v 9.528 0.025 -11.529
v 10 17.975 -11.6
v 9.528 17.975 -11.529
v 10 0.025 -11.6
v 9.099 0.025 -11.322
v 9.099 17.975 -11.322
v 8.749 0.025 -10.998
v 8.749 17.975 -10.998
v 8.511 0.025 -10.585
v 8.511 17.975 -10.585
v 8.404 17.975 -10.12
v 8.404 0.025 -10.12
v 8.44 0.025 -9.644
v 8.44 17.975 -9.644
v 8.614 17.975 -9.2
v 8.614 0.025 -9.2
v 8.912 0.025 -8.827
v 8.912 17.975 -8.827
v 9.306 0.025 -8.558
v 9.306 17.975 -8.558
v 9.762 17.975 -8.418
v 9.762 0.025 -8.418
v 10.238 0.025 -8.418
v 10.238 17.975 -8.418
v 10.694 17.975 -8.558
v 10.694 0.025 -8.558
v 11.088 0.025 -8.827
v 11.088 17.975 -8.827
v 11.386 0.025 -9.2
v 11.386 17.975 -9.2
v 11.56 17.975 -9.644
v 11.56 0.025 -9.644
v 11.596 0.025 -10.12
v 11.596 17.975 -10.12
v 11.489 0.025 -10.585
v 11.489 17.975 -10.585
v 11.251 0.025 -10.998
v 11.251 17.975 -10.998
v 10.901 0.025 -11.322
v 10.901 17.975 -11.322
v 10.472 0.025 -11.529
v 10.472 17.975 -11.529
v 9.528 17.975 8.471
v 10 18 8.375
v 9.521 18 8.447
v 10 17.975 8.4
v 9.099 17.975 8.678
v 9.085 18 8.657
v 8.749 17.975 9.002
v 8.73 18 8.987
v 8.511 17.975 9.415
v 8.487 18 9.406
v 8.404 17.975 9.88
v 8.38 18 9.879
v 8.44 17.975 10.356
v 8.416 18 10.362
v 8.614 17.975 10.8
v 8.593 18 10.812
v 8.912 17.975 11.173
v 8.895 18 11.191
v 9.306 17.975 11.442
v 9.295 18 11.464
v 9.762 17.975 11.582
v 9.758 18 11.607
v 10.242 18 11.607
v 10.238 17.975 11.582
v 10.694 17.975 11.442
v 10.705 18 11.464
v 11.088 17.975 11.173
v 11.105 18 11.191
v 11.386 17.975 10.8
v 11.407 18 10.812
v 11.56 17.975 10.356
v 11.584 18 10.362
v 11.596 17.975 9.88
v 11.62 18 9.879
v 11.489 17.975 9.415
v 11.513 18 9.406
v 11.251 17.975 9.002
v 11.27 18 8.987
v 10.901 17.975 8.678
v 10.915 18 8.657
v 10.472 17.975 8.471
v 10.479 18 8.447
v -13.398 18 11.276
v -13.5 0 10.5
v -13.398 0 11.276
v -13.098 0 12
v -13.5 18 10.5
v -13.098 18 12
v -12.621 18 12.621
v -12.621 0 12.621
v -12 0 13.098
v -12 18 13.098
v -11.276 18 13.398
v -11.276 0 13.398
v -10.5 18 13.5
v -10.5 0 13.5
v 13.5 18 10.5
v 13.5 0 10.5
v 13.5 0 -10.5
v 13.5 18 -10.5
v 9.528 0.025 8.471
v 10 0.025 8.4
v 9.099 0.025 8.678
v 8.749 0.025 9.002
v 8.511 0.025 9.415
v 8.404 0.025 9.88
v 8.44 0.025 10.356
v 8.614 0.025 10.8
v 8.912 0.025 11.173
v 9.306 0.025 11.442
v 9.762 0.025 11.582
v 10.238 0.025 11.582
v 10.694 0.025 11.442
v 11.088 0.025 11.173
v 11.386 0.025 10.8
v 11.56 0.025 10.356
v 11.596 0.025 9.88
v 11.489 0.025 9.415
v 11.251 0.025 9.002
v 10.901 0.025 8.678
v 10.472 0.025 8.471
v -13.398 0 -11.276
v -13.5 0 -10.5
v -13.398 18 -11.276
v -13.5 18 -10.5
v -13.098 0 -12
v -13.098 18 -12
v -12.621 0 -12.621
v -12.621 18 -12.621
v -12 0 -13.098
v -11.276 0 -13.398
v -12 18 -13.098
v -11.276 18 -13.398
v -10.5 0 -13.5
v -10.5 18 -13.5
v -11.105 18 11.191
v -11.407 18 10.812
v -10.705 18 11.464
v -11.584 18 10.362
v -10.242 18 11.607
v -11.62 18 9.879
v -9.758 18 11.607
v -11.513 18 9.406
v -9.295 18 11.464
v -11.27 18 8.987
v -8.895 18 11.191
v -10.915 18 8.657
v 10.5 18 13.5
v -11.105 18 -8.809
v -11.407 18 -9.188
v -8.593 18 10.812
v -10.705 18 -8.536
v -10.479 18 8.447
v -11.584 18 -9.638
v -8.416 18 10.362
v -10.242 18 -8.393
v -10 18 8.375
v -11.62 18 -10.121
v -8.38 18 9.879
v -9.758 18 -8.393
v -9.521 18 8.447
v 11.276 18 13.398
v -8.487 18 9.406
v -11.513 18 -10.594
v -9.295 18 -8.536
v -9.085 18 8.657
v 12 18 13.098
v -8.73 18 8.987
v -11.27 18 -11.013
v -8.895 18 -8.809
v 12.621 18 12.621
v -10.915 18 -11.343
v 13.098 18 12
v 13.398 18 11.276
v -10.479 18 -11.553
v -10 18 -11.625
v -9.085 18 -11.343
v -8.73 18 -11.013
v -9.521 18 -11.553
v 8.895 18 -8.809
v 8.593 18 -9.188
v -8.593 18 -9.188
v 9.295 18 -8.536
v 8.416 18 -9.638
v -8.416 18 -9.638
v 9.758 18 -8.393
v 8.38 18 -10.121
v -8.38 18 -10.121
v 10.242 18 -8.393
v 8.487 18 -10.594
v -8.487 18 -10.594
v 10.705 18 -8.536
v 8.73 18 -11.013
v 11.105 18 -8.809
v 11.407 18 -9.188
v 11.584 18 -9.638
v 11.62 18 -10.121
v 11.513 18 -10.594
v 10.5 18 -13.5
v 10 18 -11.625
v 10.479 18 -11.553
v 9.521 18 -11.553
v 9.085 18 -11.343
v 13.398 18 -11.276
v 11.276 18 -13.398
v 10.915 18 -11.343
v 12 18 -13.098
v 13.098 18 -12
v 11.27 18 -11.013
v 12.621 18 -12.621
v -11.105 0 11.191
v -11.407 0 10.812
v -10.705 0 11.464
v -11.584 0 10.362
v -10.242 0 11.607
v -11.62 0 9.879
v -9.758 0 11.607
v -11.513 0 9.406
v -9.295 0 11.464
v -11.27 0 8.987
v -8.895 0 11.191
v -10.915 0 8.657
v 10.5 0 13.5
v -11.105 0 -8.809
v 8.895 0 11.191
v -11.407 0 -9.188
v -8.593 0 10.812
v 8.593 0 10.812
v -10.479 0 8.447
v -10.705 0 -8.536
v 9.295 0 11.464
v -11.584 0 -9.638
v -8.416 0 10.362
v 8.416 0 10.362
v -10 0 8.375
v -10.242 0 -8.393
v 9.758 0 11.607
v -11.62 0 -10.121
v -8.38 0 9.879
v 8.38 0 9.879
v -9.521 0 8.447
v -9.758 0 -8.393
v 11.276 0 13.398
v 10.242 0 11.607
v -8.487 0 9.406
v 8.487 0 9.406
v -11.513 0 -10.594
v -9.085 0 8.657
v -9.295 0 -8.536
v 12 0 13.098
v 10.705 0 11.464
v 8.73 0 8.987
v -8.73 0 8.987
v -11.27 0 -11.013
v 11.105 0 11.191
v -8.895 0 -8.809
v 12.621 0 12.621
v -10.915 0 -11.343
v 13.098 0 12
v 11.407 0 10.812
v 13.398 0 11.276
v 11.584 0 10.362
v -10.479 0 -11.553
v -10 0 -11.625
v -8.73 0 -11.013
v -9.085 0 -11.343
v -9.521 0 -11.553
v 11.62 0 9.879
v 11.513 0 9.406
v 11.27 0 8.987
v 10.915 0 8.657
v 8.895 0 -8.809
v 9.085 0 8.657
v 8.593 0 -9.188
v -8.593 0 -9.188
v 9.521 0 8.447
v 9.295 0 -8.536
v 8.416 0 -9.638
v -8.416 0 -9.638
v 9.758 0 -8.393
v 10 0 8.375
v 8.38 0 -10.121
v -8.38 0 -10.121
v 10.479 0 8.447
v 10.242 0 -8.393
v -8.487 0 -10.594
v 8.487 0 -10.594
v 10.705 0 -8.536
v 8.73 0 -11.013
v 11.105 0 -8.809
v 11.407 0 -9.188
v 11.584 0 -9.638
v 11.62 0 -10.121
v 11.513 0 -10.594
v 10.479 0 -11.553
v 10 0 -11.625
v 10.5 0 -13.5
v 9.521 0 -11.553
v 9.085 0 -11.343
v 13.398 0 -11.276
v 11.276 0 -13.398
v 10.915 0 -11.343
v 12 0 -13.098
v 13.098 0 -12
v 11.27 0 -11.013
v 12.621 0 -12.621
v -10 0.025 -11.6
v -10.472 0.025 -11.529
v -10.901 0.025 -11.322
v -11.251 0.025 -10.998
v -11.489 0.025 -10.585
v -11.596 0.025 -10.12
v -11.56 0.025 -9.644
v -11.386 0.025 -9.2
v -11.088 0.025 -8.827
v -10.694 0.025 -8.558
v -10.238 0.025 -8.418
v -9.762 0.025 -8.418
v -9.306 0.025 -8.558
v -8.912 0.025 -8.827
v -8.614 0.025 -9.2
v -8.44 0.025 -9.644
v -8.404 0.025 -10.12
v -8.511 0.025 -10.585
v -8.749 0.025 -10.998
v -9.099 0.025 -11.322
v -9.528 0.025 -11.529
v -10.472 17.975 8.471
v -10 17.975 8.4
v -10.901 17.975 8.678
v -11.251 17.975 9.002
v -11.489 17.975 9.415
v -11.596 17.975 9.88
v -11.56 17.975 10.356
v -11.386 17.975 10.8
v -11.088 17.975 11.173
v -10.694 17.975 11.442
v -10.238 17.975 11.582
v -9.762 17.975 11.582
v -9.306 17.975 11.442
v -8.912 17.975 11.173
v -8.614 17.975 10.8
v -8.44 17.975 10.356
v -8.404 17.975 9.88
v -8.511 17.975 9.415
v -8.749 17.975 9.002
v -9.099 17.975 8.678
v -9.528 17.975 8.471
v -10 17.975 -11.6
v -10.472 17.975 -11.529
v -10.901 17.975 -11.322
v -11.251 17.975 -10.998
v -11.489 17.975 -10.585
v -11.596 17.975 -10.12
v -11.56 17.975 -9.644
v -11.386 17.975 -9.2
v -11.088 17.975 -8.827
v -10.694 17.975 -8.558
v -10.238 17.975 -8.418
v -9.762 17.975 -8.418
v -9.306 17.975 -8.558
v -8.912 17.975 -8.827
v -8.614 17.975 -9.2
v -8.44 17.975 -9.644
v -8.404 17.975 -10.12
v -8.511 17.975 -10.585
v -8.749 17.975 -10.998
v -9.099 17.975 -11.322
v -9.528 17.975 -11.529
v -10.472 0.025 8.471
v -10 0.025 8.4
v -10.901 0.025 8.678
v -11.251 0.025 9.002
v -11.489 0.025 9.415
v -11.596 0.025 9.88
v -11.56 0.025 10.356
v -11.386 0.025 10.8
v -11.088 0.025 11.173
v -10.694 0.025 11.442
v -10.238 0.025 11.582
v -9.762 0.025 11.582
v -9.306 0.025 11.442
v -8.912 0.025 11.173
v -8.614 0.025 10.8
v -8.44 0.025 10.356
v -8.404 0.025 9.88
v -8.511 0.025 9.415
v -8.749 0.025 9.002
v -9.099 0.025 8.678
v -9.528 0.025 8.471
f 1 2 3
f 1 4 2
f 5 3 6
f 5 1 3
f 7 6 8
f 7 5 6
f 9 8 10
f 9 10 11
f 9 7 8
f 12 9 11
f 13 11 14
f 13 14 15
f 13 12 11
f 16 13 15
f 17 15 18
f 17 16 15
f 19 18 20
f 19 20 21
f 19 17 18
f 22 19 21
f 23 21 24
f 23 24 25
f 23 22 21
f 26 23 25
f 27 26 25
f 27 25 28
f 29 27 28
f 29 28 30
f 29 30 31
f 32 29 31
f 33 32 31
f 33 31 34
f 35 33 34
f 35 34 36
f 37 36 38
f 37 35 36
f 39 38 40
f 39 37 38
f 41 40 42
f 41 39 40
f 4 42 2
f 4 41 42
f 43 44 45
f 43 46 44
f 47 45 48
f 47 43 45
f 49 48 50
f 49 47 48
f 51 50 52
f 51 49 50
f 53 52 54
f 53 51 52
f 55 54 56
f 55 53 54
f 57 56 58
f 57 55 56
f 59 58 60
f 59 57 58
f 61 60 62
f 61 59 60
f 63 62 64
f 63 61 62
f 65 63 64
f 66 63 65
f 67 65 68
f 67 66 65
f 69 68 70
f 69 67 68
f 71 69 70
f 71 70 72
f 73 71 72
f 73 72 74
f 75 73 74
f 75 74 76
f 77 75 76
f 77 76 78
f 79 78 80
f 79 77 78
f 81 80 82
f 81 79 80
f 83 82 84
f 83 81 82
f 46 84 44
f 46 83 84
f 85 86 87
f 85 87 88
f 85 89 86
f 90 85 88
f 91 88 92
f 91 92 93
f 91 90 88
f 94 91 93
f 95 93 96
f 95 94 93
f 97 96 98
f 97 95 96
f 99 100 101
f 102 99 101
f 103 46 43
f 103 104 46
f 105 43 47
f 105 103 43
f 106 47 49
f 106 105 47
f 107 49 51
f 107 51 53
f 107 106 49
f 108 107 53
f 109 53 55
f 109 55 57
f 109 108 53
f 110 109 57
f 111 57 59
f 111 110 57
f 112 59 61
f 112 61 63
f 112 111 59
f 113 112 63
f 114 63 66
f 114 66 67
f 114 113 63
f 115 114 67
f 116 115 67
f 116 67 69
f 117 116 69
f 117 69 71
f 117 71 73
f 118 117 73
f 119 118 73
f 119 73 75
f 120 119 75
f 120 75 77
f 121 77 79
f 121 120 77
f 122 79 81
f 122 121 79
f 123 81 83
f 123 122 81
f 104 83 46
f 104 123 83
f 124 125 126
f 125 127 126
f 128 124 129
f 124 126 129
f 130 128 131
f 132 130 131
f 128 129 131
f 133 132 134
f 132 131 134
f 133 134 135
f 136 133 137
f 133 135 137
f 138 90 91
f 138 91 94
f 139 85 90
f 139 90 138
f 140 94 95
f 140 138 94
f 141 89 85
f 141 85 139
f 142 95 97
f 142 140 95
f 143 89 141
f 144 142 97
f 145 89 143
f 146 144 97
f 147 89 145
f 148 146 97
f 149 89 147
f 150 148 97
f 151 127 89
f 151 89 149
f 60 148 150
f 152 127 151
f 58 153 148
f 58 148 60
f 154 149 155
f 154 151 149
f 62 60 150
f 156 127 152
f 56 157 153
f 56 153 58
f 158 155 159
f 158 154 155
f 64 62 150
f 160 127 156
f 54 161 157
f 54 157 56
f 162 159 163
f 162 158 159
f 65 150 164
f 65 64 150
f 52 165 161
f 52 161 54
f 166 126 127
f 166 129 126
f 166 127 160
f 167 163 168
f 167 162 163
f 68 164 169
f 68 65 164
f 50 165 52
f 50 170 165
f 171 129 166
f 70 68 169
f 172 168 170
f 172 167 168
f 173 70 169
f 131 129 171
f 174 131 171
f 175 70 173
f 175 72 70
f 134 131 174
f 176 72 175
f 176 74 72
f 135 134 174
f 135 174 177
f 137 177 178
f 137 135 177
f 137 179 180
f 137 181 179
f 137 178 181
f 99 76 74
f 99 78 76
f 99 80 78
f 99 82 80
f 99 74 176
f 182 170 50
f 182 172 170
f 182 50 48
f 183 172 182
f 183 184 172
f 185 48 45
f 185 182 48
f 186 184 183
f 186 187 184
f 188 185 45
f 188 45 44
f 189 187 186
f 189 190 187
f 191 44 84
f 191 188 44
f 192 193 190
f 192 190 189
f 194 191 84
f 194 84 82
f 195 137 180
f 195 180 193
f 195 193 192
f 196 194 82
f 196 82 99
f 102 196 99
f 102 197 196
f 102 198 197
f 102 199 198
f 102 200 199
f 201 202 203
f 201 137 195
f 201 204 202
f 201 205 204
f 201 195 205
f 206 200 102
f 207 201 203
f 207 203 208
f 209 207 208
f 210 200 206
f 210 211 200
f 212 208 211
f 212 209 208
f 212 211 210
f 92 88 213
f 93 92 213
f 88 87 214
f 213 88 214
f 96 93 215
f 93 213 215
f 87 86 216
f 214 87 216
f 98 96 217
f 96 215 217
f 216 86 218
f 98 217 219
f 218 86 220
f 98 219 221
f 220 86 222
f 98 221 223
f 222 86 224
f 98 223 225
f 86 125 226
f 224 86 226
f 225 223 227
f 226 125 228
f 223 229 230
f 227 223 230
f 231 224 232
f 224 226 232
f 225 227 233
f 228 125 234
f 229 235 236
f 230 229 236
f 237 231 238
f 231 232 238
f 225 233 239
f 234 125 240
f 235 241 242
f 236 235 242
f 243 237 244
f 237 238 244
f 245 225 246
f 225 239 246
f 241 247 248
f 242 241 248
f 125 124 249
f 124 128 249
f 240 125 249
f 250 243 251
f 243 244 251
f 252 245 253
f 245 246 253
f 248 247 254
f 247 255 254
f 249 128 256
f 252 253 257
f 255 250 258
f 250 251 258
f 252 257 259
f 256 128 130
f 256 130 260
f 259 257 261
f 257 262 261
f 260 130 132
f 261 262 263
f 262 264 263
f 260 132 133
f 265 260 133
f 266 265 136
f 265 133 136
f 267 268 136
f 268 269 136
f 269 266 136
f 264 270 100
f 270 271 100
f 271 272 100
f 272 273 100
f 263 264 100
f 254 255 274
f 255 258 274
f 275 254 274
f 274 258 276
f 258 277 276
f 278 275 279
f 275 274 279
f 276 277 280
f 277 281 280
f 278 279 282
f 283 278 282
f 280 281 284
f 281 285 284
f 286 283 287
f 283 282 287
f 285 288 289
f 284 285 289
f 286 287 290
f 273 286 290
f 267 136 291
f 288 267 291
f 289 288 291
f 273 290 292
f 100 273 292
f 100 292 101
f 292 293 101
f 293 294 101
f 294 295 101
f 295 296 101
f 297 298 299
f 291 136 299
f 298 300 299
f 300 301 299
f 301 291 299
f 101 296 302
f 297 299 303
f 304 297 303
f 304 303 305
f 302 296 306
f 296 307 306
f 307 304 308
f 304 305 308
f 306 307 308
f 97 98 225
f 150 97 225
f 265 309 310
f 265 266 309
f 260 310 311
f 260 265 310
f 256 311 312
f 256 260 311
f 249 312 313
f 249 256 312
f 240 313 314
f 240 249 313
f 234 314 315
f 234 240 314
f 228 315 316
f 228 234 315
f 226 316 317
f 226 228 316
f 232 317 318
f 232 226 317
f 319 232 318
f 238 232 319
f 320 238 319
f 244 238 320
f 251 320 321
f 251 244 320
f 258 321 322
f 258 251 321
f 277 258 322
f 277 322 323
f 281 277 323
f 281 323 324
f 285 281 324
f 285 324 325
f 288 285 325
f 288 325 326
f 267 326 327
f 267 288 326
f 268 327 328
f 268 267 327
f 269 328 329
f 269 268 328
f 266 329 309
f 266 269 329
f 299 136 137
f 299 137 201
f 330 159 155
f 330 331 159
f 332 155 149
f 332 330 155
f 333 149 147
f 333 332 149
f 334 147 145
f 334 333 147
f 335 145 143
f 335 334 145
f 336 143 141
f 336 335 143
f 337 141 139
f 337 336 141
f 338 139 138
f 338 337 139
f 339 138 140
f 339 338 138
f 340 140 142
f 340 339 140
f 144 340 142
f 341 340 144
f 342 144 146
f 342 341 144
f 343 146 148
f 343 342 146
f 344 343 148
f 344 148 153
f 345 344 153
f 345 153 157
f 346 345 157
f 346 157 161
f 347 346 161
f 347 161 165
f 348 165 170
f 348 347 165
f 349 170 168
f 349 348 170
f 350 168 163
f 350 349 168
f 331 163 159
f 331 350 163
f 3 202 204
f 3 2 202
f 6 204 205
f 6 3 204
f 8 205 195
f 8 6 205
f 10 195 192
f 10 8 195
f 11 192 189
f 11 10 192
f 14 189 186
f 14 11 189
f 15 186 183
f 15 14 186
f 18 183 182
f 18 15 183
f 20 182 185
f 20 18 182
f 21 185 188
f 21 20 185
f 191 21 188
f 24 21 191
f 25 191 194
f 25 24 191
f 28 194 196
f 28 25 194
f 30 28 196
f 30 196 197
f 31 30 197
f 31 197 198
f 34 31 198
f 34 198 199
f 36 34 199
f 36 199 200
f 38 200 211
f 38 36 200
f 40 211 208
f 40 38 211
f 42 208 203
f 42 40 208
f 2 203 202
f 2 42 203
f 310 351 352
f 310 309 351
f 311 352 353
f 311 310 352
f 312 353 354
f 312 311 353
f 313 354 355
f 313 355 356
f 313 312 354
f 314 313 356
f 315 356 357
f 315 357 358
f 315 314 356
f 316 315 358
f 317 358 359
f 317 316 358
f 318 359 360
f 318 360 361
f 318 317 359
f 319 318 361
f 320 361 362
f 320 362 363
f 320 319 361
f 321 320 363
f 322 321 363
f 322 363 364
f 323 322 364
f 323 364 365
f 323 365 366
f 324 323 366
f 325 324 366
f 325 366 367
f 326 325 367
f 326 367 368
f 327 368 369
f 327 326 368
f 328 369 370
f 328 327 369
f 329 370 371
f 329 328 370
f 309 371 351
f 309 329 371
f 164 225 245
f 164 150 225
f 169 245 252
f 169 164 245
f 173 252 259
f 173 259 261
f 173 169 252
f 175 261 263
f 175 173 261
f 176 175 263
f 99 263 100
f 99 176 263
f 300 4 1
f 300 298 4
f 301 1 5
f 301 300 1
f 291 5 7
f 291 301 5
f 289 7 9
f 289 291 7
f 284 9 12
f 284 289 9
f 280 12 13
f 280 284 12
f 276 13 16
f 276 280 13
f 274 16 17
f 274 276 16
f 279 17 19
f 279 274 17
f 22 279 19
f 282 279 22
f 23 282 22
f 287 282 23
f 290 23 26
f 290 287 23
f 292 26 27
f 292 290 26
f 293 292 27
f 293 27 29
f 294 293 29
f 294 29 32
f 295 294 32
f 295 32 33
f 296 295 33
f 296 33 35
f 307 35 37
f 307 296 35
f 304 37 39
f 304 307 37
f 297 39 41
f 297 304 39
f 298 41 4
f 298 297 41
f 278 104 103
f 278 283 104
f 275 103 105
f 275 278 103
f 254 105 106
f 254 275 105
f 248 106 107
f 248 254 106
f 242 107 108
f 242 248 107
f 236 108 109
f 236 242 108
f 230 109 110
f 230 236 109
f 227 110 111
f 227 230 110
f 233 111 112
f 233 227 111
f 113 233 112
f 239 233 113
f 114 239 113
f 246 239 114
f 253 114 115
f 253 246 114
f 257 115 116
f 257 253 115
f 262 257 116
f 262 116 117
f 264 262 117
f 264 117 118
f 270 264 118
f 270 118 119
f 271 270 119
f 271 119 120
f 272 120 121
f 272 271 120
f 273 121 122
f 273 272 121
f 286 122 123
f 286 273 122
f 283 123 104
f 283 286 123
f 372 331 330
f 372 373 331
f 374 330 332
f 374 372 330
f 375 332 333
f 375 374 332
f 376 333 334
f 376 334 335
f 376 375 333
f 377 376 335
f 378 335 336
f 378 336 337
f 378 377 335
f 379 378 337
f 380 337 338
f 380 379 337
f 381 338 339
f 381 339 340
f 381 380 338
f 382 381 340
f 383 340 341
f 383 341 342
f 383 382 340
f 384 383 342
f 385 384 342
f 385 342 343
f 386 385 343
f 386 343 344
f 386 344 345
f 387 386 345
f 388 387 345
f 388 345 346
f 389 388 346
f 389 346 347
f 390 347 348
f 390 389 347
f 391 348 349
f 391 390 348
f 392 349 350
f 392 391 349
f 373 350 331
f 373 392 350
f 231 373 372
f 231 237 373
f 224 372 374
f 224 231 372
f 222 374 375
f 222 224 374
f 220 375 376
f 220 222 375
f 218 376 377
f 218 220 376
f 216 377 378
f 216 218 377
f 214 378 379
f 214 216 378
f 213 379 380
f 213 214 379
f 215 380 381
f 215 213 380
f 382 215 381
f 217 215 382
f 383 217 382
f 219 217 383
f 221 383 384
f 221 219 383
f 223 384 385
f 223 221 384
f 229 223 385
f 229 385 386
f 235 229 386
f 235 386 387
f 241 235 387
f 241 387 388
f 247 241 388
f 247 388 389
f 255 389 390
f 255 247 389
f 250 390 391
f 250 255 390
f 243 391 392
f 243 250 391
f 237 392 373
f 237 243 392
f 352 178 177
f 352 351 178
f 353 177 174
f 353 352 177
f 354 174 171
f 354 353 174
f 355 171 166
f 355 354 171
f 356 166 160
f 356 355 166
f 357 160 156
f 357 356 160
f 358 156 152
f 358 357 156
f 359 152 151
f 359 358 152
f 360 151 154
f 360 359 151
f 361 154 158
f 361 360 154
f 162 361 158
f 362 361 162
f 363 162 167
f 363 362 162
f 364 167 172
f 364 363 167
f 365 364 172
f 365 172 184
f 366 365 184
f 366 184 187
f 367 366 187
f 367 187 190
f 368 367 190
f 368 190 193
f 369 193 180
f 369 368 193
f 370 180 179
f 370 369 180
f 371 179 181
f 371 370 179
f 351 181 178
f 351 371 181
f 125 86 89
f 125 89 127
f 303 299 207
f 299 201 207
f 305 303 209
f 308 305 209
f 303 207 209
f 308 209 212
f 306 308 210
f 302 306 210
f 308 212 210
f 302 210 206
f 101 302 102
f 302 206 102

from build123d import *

# Parameters (mm, degrees)
SKETCH1_W                     = 27
SKETCH1_H                     = 27
BOSS_EXTRUDE1_DEPTH           = 18
M3_CLEARANCE_HOLE1_AT_2_COUNT = 2
M3_CLEARANCE_HOLE1_AT_2_PITCH = 20
M3_CLEARANCE_HOLE1_AT_3_COUNT = 2
M3_CLEARANCE_HOLE1_AT_3_PITCH = 28.284271247
M3_CLEARANCE_HOLE1_AT_4_COUNT = 2
M3_CLEARANCE_HOLE1_AT_4_PITCH = 20
FILLET1_R                     = 3


with BuildPart() as part:
    # Sketch1 → Boss-Extrude1 (new body)
    with BuildSketch(Plane(origin=(0, 0, 0), x_dir=(1, 0, 0), z_dir=(0, 1, 0))):
        Rectangle(SKETCH1_W, SKETCH1_H)
    extrude(amount=BOSS_EXTRUDE1_DEPTH)

    # Sketch4 → M3 Clearance Hole1 (revolve, cut)
    with BuildSketch(Plane(origin=(10, 0, -10), x_dir=(0, 0, -1), z_dir=(1, 0, 0))):
        Polygon((0, 0), (0, 18), (1.625, 18), (1.6, 17.975), (1.6, 0.025), (1.625, 0), align=None)
    m3_clearance_hole1 = revolve(axis=Axis((10, -6.35, -10), (0, 1, 0)), mode=Mode.SUBTRACT)

    # M3 Clearance Hole1 at 2: M3 Clearance Hole1 ×2
    with Locations(*[(-i * M3_CLEARANCE_HOLE1_AT_2_PITCH, 0, 0) for i in range(1, M3_CLEARANCE_HOLE1_AT_2_COUNT)]):
        add(m3_clearance_hole1, mode=Mode.SUBTRACT)

    # M3 Clearance Hole1 at 3: M3 Clearance Hole1 ×2
    with Locations(*[Vector(-0.7071067811865476, 0, 0.7071067811865475) * (i * M3_CLEARANCE_HOLE1_AT_3_PITCH) for i in range(1, M3_CLEARANCE_HOLE1_AT_3_COUNT)]):
        add(m3_clearance_hole1, mode=Mode.SUBTRACT)

    # M3 Clearance Hole1 at 4: M3 Clearance Hole1 ×2
    with Locations(*[(0, 0, i * M3_CLEARANCE_HOLE1_AT_4_PITCH) for i in range(1, M3_CLEARANCE_HOLE1_AT_4_COUNT)]):
        add(m3_clearance_hole1, mode=Mode.SUBTRACT)

    # Fillet1
    fillet1_edges = [part.edges().sort_by_distance(p)[0] for p in [
        (-13.5, 9, -13.5),
        (13.5, 9, -13.5),
        (13.5, 9, 13.5),
        (-13.5, 9, 13.5),
    ]]
    fillet(fillet1_edges, radius=FILLET1_R)


solid = part.part
